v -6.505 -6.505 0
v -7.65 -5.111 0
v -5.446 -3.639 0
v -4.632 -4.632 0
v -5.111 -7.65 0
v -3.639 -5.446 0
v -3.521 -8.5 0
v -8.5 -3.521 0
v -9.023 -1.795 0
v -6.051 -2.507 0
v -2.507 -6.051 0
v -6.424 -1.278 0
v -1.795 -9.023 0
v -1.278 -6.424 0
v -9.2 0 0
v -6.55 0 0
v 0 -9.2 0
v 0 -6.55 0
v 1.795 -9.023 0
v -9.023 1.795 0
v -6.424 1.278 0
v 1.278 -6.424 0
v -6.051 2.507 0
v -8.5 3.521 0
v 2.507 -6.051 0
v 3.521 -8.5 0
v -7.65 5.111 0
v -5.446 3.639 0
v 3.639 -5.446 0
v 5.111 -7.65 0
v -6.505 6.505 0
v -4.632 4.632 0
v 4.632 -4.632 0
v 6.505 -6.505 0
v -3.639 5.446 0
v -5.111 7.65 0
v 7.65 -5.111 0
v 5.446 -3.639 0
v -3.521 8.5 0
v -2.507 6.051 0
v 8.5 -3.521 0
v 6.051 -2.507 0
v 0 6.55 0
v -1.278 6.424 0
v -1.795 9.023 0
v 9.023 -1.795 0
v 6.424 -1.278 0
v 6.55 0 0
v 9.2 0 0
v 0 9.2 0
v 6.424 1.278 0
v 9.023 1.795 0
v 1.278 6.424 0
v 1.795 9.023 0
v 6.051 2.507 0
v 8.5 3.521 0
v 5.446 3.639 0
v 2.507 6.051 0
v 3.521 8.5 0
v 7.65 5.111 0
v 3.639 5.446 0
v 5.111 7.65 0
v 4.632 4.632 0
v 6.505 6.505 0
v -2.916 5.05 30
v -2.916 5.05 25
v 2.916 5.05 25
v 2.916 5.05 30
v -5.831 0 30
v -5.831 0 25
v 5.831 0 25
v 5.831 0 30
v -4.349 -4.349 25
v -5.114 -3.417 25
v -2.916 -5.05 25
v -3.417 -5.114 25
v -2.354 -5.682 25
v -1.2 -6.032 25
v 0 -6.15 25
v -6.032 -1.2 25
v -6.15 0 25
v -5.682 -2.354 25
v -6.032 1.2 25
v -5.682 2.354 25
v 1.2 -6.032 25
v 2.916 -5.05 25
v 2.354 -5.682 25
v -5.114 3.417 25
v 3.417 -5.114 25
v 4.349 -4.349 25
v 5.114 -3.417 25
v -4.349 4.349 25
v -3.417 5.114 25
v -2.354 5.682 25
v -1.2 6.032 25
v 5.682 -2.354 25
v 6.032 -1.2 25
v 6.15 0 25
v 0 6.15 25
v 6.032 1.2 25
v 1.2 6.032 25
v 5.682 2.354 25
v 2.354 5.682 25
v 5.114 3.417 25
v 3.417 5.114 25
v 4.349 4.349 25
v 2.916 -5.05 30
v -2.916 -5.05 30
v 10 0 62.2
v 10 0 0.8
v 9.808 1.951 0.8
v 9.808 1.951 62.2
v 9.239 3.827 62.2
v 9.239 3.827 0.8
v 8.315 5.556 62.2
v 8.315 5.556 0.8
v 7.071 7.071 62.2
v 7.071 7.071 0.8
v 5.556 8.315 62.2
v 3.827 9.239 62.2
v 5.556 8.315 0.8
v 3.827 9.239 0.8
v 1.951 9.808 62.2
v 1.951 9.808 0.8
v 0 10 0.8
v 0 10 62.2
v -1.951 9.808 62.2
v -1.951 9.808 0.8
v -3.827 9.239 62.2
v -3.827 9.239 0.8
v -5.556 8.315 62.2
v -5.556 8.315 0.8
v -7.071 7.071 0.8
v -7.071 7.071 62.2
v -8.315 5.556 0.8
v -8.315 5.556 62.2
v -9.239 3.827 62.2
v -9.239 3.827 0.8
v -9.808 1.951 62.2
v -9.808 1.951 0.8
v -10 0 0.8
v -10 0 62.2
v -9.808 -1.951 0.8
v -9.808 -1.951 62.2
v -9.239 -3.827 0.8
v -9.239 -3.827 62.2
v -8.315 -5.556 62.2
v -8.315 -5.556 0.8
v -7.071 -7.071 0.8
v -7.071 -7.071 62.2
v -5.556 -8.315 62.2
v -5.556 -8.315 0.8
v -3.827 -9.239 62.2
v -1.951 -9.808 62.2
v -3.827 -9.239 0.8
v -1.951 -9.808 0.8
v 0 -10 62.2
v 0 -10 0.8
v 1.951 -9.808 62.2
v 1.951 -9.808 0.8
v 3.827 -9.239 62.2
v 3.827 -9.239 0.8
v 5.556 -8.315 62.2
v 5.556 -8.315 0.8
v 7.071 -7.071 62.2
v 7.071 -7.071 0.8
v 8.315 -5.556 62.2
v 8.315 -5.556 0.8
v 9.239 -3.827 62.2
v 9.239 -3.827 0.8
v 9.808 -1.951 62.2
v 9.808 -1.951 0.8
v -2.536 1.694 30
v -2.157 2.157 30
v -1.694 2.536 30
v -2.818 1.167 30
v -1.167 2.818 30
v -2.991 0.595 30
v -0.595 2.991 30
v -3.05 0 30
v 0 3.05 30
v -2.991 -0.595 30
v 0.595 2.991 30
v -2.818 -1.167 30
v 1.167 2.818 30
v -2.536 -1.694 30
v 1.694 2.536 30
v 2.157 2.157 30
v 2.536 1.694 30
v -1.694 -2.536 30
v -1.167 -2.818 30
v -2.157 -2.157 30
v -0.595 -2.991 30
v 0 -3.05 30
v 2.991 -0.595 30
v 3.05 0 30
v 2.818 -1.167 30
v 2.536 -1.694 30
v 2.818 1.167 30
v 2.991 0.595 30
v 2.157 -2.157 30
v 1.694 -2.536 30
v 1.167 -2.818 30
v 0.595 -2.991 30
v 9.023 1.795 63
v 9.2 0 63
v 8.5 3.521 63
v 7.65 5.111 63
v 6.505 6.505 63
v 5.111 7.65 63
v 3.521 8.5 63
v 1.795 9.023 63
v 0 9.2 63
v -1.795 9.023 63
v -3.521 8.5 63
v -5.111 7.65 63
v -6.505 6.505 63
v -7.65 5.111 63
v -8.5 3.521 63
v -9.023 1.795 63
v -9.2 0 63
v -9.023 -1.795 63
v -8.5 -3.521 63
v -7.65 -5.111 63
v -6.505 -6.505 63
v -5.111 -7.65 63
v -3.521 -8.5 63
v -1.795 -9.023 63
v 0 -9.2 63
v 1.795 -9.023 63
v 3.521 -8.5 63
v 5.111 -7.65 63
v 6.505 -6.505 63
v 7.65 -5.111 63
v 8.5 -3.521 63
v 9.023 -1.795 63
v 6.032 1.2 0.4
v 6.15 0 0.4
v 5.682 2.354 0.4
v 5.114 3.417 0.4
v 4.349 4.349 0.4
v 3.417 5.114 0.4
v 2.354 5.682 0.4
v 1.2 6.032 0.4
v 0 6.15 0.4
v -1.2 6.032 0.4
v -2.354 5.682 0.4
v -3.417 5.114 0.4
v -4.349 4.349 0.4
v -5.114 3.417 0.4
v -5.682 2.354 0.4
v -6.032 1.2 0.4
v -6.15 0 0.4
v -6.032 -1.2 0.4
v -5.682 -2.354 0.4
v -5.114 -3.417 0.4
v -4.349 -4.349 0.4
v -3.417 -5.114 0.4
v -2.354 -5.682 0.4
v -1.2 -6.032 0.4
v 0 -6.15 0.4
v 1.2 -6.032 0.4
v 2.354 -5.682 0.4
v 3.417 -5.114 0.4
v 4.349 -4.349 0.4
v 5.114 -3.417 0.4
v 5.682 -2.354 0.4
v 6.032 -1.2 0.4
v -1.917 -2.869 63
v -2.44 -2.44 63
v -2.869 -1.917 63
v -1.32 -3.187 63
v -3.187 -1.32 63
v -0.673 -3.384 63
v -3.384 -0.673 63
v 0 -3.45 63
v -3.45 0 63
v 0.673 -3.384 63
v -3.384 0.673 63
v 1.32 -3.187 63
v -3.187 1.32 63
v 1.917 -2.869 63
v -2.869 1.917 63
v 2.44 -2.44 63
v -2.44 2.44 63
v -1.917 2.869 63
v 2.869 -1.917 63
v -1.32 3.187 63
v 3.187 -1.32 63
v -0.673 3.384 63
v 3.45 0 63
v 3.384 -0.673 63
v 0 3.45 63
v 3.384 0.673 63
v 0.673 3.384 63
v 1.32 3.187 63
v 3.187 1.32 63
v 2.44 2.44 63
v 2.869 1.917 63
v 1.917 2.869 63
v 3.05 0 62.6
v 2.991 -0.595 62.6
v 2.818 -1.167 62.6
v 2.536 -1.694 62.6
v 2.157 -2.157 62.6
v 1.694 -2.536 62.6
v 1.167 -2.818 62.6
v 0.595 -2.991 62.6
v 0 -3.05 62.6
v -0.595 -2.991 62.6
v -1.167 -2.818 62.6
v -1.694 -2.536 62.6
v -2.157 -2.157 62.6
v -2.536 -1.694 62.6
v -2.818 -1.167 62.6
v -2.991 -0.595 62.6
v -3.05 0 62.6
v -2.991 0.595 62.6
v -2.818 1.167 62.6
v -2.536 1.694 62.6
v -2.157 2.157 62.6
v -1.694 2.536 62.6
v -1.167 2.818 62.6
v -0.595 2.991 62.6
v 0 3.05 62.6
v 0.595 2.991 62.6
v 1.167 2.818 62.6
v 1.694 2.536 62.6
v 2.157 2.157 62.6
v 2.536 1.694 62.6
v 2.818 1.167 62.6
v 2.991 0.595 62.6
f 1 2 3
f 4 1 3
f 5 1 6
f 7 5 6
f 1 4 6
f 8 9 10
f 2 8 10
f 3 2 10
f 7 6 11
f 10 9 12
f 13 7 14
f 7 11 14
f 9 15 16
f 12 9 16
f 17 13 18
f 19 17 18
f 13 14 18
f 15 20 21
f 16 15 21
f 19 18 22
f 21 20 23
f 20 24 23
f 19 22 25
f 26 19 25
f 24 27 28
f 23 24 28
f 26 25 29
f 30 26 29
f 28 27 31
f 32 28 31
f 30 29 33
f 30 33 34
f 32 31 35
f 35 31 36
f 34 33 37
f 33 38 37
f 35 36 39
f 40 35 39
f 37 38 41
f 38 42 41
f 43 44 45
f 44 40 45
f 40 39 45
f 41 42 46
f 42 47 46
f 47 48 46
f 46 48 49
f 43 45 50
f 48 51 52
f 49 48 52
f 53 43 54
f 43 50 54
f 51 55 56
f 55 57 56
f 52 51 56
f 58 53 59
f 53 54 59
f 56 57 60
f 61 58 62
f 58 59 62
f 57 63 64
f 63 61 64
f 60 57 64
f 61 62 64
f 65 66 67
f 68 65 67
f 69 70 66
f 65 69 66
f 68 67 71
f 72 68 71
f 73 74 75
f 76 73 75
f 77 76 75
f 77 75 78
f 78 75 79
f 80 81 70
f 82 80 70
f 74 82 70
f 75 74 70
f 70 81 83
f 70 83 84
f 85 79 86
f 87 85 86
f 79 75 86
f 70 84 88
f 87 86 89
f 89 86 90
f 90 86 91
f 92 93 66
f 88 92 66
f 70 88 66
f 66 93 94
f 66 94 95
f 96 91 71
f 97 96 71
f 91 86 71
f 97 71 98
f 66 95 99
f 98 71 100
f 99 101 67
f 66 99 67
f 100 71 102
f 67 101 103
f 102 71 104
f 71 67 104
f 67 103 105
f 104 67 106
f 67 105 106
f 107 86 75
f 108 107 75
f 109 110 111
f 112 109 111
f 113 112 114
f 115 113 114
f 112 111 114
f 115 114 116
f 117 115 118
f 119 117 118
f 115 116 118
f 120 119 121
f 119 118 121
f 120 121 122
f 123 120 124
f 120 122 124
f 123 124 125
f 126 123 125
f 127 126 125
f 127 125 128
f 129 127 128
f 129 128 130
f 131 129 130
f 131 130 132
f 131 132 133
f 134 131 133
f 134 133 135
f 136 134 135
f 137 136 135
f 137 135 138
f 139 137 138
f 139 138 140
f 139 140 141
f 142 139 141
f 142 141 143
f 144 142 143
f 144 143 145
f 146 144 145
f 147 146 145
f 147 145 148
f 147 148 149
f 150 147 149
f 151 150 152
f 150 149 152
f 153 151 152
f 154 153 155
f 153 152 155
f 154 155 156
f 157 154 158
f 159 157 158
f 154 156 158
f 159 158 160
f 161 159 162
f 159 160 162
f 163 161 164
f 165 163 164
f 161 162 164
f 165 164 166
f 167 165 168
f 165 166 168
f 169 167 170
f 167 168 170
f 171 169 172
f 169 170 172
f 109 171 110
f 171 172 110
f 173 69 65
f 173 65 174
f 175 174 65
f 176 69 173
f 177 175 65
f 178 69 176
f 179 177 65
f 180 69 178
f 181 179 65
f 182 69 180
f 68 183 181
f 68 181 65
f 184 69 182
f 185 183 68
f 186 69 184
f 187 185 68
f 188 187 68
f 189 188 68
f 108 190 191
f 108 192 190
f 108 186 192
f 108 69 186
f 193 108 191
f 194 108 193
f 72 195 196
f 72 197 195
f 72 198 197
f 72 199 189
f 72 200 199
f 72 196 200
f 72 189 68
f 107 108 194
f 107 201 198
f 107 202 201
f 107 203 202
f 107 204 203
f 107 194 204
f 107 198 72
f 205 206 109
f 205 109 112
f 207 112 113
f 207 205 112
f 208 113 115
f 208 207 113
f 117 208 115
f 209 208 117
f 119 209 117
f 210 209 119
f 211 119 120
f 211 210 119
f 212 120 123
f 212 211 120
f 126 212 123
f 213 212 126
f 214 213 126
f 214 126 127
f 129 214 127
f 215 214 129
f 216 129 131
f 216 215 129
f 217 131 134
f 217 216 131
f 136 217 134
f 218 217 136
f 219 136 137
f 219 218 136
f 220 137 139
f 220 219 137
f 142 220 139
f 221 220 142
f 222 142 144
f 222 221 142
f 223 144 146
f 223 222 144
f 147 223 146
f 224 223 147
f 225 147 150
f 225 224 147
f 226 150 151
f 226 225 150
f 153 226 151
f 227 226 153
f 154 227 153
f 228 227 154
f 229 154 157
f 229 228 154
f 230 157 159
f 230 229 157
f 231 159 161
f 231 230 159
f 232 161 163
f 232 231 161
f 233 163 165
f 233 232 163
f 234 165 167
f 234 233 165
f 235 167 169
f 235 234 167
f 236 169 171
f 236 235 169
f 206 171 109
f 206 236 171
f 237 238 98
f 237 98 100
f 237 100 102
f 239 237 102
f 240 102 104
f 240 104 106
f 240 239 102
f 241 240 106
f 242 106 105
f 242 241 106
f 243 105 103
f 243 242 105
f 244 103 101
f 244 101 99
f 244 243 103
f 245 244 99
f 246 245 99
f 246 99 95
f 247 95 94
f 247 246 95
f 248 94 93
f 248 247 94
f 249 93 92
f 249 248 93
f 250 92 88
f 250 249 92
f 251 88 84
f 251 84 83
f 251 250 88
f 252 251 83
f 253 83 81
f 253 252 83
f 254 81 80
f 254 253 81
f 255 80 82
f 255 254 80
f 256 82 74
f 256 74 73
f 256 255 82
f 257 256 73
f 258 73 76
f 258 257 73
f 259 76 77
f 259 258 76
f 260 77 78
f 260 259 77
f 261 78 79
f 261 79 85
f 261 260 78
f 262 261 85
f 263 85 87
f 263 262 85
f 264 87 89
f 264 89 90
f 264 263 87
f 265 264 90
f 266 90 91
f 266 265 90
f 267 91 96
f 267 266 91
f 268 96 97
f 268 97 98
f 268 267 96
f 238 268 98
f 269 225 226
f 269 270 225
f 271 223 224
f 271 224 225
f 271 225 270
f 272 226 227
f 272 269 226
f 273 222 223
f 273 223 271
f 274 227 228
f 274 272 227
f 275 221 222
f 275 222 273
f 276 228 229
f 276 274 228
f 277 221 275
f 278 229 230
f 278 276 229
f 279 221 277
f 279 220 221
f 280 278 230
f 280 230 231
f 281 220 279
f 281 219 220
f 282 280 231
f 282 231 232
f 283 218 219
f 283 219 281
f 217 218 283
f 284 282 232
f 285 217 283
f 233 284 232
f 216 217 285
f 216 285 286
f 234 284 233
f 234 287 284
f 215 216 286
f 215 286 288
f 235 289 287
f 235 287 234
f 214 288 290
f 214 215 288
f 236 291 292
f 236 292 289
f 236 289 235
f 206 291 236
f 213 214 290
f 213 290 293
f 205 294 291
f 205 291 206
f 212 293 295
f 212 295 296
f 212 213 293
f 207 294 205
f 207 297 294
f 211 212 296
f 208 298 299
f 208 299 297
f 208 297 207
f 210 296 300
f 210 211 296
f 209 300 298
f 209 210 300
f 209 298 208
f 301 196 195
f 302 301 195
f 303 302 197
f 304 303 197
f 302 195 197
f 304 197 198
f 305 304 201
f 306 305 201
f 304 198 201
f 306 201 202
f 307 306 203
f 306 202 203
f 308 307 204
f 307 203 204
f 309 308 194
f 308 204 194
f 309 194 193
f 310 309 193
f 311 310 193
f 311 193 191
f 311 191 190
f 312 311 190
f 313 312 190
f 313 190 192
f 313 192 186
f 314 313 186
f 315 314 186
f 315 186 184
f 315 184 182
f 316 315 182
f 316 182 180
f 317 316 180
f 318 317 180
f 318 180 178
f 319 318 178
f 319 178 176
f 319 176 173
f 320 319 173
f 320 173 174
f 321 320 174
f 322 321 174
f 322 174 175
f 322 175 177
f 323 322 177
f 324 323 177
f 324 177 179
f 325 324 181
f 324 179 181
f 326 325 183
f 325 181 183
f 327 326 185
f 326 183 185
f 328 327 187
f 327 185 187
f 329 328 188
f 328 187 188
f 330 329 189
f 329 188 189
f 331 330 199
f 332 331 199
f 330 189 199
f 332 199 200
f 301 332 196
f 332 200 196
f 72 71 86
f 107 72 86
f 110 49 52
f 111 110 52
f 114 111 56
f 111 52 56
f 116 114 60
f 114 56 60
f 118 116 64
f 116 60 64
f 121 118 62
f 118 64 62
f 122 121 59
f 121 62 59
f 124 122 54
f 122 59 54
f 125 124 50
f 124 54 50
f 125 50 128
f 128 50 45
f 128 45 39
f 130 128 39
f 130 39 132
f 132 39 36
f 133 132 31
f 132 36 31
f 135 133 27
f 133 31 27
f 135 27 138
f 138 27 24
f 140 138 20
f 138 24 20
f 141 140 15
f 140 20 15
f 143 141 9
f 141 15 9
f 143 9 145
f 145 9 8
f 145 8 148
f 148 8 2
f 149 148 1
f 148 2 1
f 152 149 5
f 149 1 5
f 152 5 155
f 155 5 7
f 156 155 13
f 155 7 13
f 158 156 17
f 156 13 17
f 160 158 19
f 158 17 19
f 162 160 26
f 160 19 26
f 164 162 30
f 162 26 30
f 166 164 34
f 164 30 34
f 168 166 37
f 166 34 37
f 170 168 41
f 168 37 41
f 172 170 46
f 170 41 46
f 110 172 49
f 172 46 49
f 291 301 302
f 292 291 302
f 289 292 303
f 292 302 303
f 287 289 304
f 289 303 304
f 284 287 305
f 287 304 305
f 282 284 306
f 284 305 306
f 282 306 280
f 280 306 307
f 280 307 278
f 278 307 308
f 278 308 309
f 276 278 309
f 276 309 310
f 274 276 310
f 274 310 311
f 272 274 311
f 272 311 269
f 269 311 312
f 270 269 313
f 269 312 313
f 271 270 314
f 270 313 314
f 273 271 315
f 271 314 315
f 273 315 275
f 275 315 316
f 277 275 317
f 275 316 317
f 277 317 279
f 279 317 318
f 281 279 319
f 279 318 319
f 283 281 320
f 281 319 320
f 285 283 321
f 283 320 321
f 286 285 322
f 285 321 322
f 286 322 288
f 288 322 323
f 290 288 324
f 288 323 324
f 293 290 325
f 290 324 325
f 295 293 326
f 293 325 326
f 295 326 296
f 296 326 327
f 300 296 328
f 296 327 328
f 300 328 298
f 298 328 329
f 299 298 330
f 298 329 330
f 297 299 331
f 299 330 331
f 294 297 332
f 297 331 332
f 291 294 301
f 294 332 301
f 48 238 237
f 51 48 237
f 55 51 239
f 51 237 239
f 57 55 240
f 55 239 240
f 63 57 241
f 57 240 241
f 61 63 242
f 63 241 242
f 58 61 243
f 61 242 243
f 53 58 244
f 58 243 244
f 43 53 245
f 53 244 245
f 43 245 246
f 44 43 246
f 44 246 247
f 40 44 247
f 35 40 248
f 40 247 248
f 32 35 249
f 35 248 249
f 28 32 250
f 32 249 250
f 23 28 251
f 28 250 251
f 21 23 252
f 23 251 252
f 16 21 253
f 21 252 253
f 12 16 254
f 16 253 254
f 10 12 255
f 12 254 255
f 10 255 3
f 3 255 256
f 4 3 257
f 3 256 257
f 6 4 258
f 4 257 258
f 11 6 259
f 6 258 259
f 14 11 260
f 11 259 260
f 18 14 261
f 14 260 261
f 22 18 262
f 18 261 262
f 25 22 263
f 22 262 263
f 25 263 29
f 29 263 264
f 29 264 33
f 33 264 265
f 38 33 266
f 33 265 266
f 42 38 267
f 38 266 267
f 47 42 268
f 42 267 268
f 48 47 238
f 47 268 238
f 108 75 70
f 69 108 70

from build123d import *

# Parameters (mm, degrees)
F0_R     = 10
F0_R_2   = 6.15
F1_DEPTH = 25
F2_R     = 10
F3_DEPTH = 38
F5_DEPTH = 5
F6_R     = 3.05
F7_DEPTH = 50
F8_SIZE  = 0.8
F9_SIZE  = 0.4
F10_SIZE = 0.4


with BuildPart() as f1:
    # F0 (on Top) → F1 (new body)
    with BuildSketch(Plane.XY):
        Circle(F0_R)
        Circle(F0_R_2, mode=Mode.SUBTRACT)
    extrude(amount=F1_DEPTH)

    # F2 (on face) → F3 (join)
    with BuildSketch(Plane.XY.offset(25)):
        Circle(F2_R)
    extrude(amount=F3_DEPTH)

    # F4 (on face) → F5 (cut)
    with BuildSketch(Plane(origin=(0, 0, 25), x_dir=(1, 0, 0), z_dir=(0, 0, -1))):
        Polygon((-2.915619, -5.05), (2.915619, -5.05), (5.831238, 0), (2.915619, 5.05), (-2.915619, 5.05), (-5.831238, 0), align=None)
    extrude(amount=-F5_DEPTH, mode=Mode.SUBTRACT)

    # F6 (on face) → F7 (cut)
    with BuildSketch(Plane(origin=(0, 0, 30), x_dir=(1, 0, 0), z_dir=(0, 0, -1))):
        Circle(F6_R)
    extrude(amount=-F7_DEPTH, mode=Mode.SUBTRACT)

    # F8
    f8_edges = [f1.edges().sort_by_distance(p)[0] for p in [
        (-10, 0, 0),
        (-10, 0, 63),
    ]]
    chamfer(f8_edges, length=F8_SIZE)

    # F9
    f9_edges = [f1.edges().sort_by_distance(p)[0] for p in [
        (-3.05, 0, 63),
    ]]
    chamfer(f9_edges, length=F9_SIZE)

    # F10
    f10_edges = [f1.edges().sort_by_distance(p)[0] for p in [
        (-6.15, 0, 0),
    ]]
    chamfer(f10_edges, length=F10_SIZE)


solid = f1.part
